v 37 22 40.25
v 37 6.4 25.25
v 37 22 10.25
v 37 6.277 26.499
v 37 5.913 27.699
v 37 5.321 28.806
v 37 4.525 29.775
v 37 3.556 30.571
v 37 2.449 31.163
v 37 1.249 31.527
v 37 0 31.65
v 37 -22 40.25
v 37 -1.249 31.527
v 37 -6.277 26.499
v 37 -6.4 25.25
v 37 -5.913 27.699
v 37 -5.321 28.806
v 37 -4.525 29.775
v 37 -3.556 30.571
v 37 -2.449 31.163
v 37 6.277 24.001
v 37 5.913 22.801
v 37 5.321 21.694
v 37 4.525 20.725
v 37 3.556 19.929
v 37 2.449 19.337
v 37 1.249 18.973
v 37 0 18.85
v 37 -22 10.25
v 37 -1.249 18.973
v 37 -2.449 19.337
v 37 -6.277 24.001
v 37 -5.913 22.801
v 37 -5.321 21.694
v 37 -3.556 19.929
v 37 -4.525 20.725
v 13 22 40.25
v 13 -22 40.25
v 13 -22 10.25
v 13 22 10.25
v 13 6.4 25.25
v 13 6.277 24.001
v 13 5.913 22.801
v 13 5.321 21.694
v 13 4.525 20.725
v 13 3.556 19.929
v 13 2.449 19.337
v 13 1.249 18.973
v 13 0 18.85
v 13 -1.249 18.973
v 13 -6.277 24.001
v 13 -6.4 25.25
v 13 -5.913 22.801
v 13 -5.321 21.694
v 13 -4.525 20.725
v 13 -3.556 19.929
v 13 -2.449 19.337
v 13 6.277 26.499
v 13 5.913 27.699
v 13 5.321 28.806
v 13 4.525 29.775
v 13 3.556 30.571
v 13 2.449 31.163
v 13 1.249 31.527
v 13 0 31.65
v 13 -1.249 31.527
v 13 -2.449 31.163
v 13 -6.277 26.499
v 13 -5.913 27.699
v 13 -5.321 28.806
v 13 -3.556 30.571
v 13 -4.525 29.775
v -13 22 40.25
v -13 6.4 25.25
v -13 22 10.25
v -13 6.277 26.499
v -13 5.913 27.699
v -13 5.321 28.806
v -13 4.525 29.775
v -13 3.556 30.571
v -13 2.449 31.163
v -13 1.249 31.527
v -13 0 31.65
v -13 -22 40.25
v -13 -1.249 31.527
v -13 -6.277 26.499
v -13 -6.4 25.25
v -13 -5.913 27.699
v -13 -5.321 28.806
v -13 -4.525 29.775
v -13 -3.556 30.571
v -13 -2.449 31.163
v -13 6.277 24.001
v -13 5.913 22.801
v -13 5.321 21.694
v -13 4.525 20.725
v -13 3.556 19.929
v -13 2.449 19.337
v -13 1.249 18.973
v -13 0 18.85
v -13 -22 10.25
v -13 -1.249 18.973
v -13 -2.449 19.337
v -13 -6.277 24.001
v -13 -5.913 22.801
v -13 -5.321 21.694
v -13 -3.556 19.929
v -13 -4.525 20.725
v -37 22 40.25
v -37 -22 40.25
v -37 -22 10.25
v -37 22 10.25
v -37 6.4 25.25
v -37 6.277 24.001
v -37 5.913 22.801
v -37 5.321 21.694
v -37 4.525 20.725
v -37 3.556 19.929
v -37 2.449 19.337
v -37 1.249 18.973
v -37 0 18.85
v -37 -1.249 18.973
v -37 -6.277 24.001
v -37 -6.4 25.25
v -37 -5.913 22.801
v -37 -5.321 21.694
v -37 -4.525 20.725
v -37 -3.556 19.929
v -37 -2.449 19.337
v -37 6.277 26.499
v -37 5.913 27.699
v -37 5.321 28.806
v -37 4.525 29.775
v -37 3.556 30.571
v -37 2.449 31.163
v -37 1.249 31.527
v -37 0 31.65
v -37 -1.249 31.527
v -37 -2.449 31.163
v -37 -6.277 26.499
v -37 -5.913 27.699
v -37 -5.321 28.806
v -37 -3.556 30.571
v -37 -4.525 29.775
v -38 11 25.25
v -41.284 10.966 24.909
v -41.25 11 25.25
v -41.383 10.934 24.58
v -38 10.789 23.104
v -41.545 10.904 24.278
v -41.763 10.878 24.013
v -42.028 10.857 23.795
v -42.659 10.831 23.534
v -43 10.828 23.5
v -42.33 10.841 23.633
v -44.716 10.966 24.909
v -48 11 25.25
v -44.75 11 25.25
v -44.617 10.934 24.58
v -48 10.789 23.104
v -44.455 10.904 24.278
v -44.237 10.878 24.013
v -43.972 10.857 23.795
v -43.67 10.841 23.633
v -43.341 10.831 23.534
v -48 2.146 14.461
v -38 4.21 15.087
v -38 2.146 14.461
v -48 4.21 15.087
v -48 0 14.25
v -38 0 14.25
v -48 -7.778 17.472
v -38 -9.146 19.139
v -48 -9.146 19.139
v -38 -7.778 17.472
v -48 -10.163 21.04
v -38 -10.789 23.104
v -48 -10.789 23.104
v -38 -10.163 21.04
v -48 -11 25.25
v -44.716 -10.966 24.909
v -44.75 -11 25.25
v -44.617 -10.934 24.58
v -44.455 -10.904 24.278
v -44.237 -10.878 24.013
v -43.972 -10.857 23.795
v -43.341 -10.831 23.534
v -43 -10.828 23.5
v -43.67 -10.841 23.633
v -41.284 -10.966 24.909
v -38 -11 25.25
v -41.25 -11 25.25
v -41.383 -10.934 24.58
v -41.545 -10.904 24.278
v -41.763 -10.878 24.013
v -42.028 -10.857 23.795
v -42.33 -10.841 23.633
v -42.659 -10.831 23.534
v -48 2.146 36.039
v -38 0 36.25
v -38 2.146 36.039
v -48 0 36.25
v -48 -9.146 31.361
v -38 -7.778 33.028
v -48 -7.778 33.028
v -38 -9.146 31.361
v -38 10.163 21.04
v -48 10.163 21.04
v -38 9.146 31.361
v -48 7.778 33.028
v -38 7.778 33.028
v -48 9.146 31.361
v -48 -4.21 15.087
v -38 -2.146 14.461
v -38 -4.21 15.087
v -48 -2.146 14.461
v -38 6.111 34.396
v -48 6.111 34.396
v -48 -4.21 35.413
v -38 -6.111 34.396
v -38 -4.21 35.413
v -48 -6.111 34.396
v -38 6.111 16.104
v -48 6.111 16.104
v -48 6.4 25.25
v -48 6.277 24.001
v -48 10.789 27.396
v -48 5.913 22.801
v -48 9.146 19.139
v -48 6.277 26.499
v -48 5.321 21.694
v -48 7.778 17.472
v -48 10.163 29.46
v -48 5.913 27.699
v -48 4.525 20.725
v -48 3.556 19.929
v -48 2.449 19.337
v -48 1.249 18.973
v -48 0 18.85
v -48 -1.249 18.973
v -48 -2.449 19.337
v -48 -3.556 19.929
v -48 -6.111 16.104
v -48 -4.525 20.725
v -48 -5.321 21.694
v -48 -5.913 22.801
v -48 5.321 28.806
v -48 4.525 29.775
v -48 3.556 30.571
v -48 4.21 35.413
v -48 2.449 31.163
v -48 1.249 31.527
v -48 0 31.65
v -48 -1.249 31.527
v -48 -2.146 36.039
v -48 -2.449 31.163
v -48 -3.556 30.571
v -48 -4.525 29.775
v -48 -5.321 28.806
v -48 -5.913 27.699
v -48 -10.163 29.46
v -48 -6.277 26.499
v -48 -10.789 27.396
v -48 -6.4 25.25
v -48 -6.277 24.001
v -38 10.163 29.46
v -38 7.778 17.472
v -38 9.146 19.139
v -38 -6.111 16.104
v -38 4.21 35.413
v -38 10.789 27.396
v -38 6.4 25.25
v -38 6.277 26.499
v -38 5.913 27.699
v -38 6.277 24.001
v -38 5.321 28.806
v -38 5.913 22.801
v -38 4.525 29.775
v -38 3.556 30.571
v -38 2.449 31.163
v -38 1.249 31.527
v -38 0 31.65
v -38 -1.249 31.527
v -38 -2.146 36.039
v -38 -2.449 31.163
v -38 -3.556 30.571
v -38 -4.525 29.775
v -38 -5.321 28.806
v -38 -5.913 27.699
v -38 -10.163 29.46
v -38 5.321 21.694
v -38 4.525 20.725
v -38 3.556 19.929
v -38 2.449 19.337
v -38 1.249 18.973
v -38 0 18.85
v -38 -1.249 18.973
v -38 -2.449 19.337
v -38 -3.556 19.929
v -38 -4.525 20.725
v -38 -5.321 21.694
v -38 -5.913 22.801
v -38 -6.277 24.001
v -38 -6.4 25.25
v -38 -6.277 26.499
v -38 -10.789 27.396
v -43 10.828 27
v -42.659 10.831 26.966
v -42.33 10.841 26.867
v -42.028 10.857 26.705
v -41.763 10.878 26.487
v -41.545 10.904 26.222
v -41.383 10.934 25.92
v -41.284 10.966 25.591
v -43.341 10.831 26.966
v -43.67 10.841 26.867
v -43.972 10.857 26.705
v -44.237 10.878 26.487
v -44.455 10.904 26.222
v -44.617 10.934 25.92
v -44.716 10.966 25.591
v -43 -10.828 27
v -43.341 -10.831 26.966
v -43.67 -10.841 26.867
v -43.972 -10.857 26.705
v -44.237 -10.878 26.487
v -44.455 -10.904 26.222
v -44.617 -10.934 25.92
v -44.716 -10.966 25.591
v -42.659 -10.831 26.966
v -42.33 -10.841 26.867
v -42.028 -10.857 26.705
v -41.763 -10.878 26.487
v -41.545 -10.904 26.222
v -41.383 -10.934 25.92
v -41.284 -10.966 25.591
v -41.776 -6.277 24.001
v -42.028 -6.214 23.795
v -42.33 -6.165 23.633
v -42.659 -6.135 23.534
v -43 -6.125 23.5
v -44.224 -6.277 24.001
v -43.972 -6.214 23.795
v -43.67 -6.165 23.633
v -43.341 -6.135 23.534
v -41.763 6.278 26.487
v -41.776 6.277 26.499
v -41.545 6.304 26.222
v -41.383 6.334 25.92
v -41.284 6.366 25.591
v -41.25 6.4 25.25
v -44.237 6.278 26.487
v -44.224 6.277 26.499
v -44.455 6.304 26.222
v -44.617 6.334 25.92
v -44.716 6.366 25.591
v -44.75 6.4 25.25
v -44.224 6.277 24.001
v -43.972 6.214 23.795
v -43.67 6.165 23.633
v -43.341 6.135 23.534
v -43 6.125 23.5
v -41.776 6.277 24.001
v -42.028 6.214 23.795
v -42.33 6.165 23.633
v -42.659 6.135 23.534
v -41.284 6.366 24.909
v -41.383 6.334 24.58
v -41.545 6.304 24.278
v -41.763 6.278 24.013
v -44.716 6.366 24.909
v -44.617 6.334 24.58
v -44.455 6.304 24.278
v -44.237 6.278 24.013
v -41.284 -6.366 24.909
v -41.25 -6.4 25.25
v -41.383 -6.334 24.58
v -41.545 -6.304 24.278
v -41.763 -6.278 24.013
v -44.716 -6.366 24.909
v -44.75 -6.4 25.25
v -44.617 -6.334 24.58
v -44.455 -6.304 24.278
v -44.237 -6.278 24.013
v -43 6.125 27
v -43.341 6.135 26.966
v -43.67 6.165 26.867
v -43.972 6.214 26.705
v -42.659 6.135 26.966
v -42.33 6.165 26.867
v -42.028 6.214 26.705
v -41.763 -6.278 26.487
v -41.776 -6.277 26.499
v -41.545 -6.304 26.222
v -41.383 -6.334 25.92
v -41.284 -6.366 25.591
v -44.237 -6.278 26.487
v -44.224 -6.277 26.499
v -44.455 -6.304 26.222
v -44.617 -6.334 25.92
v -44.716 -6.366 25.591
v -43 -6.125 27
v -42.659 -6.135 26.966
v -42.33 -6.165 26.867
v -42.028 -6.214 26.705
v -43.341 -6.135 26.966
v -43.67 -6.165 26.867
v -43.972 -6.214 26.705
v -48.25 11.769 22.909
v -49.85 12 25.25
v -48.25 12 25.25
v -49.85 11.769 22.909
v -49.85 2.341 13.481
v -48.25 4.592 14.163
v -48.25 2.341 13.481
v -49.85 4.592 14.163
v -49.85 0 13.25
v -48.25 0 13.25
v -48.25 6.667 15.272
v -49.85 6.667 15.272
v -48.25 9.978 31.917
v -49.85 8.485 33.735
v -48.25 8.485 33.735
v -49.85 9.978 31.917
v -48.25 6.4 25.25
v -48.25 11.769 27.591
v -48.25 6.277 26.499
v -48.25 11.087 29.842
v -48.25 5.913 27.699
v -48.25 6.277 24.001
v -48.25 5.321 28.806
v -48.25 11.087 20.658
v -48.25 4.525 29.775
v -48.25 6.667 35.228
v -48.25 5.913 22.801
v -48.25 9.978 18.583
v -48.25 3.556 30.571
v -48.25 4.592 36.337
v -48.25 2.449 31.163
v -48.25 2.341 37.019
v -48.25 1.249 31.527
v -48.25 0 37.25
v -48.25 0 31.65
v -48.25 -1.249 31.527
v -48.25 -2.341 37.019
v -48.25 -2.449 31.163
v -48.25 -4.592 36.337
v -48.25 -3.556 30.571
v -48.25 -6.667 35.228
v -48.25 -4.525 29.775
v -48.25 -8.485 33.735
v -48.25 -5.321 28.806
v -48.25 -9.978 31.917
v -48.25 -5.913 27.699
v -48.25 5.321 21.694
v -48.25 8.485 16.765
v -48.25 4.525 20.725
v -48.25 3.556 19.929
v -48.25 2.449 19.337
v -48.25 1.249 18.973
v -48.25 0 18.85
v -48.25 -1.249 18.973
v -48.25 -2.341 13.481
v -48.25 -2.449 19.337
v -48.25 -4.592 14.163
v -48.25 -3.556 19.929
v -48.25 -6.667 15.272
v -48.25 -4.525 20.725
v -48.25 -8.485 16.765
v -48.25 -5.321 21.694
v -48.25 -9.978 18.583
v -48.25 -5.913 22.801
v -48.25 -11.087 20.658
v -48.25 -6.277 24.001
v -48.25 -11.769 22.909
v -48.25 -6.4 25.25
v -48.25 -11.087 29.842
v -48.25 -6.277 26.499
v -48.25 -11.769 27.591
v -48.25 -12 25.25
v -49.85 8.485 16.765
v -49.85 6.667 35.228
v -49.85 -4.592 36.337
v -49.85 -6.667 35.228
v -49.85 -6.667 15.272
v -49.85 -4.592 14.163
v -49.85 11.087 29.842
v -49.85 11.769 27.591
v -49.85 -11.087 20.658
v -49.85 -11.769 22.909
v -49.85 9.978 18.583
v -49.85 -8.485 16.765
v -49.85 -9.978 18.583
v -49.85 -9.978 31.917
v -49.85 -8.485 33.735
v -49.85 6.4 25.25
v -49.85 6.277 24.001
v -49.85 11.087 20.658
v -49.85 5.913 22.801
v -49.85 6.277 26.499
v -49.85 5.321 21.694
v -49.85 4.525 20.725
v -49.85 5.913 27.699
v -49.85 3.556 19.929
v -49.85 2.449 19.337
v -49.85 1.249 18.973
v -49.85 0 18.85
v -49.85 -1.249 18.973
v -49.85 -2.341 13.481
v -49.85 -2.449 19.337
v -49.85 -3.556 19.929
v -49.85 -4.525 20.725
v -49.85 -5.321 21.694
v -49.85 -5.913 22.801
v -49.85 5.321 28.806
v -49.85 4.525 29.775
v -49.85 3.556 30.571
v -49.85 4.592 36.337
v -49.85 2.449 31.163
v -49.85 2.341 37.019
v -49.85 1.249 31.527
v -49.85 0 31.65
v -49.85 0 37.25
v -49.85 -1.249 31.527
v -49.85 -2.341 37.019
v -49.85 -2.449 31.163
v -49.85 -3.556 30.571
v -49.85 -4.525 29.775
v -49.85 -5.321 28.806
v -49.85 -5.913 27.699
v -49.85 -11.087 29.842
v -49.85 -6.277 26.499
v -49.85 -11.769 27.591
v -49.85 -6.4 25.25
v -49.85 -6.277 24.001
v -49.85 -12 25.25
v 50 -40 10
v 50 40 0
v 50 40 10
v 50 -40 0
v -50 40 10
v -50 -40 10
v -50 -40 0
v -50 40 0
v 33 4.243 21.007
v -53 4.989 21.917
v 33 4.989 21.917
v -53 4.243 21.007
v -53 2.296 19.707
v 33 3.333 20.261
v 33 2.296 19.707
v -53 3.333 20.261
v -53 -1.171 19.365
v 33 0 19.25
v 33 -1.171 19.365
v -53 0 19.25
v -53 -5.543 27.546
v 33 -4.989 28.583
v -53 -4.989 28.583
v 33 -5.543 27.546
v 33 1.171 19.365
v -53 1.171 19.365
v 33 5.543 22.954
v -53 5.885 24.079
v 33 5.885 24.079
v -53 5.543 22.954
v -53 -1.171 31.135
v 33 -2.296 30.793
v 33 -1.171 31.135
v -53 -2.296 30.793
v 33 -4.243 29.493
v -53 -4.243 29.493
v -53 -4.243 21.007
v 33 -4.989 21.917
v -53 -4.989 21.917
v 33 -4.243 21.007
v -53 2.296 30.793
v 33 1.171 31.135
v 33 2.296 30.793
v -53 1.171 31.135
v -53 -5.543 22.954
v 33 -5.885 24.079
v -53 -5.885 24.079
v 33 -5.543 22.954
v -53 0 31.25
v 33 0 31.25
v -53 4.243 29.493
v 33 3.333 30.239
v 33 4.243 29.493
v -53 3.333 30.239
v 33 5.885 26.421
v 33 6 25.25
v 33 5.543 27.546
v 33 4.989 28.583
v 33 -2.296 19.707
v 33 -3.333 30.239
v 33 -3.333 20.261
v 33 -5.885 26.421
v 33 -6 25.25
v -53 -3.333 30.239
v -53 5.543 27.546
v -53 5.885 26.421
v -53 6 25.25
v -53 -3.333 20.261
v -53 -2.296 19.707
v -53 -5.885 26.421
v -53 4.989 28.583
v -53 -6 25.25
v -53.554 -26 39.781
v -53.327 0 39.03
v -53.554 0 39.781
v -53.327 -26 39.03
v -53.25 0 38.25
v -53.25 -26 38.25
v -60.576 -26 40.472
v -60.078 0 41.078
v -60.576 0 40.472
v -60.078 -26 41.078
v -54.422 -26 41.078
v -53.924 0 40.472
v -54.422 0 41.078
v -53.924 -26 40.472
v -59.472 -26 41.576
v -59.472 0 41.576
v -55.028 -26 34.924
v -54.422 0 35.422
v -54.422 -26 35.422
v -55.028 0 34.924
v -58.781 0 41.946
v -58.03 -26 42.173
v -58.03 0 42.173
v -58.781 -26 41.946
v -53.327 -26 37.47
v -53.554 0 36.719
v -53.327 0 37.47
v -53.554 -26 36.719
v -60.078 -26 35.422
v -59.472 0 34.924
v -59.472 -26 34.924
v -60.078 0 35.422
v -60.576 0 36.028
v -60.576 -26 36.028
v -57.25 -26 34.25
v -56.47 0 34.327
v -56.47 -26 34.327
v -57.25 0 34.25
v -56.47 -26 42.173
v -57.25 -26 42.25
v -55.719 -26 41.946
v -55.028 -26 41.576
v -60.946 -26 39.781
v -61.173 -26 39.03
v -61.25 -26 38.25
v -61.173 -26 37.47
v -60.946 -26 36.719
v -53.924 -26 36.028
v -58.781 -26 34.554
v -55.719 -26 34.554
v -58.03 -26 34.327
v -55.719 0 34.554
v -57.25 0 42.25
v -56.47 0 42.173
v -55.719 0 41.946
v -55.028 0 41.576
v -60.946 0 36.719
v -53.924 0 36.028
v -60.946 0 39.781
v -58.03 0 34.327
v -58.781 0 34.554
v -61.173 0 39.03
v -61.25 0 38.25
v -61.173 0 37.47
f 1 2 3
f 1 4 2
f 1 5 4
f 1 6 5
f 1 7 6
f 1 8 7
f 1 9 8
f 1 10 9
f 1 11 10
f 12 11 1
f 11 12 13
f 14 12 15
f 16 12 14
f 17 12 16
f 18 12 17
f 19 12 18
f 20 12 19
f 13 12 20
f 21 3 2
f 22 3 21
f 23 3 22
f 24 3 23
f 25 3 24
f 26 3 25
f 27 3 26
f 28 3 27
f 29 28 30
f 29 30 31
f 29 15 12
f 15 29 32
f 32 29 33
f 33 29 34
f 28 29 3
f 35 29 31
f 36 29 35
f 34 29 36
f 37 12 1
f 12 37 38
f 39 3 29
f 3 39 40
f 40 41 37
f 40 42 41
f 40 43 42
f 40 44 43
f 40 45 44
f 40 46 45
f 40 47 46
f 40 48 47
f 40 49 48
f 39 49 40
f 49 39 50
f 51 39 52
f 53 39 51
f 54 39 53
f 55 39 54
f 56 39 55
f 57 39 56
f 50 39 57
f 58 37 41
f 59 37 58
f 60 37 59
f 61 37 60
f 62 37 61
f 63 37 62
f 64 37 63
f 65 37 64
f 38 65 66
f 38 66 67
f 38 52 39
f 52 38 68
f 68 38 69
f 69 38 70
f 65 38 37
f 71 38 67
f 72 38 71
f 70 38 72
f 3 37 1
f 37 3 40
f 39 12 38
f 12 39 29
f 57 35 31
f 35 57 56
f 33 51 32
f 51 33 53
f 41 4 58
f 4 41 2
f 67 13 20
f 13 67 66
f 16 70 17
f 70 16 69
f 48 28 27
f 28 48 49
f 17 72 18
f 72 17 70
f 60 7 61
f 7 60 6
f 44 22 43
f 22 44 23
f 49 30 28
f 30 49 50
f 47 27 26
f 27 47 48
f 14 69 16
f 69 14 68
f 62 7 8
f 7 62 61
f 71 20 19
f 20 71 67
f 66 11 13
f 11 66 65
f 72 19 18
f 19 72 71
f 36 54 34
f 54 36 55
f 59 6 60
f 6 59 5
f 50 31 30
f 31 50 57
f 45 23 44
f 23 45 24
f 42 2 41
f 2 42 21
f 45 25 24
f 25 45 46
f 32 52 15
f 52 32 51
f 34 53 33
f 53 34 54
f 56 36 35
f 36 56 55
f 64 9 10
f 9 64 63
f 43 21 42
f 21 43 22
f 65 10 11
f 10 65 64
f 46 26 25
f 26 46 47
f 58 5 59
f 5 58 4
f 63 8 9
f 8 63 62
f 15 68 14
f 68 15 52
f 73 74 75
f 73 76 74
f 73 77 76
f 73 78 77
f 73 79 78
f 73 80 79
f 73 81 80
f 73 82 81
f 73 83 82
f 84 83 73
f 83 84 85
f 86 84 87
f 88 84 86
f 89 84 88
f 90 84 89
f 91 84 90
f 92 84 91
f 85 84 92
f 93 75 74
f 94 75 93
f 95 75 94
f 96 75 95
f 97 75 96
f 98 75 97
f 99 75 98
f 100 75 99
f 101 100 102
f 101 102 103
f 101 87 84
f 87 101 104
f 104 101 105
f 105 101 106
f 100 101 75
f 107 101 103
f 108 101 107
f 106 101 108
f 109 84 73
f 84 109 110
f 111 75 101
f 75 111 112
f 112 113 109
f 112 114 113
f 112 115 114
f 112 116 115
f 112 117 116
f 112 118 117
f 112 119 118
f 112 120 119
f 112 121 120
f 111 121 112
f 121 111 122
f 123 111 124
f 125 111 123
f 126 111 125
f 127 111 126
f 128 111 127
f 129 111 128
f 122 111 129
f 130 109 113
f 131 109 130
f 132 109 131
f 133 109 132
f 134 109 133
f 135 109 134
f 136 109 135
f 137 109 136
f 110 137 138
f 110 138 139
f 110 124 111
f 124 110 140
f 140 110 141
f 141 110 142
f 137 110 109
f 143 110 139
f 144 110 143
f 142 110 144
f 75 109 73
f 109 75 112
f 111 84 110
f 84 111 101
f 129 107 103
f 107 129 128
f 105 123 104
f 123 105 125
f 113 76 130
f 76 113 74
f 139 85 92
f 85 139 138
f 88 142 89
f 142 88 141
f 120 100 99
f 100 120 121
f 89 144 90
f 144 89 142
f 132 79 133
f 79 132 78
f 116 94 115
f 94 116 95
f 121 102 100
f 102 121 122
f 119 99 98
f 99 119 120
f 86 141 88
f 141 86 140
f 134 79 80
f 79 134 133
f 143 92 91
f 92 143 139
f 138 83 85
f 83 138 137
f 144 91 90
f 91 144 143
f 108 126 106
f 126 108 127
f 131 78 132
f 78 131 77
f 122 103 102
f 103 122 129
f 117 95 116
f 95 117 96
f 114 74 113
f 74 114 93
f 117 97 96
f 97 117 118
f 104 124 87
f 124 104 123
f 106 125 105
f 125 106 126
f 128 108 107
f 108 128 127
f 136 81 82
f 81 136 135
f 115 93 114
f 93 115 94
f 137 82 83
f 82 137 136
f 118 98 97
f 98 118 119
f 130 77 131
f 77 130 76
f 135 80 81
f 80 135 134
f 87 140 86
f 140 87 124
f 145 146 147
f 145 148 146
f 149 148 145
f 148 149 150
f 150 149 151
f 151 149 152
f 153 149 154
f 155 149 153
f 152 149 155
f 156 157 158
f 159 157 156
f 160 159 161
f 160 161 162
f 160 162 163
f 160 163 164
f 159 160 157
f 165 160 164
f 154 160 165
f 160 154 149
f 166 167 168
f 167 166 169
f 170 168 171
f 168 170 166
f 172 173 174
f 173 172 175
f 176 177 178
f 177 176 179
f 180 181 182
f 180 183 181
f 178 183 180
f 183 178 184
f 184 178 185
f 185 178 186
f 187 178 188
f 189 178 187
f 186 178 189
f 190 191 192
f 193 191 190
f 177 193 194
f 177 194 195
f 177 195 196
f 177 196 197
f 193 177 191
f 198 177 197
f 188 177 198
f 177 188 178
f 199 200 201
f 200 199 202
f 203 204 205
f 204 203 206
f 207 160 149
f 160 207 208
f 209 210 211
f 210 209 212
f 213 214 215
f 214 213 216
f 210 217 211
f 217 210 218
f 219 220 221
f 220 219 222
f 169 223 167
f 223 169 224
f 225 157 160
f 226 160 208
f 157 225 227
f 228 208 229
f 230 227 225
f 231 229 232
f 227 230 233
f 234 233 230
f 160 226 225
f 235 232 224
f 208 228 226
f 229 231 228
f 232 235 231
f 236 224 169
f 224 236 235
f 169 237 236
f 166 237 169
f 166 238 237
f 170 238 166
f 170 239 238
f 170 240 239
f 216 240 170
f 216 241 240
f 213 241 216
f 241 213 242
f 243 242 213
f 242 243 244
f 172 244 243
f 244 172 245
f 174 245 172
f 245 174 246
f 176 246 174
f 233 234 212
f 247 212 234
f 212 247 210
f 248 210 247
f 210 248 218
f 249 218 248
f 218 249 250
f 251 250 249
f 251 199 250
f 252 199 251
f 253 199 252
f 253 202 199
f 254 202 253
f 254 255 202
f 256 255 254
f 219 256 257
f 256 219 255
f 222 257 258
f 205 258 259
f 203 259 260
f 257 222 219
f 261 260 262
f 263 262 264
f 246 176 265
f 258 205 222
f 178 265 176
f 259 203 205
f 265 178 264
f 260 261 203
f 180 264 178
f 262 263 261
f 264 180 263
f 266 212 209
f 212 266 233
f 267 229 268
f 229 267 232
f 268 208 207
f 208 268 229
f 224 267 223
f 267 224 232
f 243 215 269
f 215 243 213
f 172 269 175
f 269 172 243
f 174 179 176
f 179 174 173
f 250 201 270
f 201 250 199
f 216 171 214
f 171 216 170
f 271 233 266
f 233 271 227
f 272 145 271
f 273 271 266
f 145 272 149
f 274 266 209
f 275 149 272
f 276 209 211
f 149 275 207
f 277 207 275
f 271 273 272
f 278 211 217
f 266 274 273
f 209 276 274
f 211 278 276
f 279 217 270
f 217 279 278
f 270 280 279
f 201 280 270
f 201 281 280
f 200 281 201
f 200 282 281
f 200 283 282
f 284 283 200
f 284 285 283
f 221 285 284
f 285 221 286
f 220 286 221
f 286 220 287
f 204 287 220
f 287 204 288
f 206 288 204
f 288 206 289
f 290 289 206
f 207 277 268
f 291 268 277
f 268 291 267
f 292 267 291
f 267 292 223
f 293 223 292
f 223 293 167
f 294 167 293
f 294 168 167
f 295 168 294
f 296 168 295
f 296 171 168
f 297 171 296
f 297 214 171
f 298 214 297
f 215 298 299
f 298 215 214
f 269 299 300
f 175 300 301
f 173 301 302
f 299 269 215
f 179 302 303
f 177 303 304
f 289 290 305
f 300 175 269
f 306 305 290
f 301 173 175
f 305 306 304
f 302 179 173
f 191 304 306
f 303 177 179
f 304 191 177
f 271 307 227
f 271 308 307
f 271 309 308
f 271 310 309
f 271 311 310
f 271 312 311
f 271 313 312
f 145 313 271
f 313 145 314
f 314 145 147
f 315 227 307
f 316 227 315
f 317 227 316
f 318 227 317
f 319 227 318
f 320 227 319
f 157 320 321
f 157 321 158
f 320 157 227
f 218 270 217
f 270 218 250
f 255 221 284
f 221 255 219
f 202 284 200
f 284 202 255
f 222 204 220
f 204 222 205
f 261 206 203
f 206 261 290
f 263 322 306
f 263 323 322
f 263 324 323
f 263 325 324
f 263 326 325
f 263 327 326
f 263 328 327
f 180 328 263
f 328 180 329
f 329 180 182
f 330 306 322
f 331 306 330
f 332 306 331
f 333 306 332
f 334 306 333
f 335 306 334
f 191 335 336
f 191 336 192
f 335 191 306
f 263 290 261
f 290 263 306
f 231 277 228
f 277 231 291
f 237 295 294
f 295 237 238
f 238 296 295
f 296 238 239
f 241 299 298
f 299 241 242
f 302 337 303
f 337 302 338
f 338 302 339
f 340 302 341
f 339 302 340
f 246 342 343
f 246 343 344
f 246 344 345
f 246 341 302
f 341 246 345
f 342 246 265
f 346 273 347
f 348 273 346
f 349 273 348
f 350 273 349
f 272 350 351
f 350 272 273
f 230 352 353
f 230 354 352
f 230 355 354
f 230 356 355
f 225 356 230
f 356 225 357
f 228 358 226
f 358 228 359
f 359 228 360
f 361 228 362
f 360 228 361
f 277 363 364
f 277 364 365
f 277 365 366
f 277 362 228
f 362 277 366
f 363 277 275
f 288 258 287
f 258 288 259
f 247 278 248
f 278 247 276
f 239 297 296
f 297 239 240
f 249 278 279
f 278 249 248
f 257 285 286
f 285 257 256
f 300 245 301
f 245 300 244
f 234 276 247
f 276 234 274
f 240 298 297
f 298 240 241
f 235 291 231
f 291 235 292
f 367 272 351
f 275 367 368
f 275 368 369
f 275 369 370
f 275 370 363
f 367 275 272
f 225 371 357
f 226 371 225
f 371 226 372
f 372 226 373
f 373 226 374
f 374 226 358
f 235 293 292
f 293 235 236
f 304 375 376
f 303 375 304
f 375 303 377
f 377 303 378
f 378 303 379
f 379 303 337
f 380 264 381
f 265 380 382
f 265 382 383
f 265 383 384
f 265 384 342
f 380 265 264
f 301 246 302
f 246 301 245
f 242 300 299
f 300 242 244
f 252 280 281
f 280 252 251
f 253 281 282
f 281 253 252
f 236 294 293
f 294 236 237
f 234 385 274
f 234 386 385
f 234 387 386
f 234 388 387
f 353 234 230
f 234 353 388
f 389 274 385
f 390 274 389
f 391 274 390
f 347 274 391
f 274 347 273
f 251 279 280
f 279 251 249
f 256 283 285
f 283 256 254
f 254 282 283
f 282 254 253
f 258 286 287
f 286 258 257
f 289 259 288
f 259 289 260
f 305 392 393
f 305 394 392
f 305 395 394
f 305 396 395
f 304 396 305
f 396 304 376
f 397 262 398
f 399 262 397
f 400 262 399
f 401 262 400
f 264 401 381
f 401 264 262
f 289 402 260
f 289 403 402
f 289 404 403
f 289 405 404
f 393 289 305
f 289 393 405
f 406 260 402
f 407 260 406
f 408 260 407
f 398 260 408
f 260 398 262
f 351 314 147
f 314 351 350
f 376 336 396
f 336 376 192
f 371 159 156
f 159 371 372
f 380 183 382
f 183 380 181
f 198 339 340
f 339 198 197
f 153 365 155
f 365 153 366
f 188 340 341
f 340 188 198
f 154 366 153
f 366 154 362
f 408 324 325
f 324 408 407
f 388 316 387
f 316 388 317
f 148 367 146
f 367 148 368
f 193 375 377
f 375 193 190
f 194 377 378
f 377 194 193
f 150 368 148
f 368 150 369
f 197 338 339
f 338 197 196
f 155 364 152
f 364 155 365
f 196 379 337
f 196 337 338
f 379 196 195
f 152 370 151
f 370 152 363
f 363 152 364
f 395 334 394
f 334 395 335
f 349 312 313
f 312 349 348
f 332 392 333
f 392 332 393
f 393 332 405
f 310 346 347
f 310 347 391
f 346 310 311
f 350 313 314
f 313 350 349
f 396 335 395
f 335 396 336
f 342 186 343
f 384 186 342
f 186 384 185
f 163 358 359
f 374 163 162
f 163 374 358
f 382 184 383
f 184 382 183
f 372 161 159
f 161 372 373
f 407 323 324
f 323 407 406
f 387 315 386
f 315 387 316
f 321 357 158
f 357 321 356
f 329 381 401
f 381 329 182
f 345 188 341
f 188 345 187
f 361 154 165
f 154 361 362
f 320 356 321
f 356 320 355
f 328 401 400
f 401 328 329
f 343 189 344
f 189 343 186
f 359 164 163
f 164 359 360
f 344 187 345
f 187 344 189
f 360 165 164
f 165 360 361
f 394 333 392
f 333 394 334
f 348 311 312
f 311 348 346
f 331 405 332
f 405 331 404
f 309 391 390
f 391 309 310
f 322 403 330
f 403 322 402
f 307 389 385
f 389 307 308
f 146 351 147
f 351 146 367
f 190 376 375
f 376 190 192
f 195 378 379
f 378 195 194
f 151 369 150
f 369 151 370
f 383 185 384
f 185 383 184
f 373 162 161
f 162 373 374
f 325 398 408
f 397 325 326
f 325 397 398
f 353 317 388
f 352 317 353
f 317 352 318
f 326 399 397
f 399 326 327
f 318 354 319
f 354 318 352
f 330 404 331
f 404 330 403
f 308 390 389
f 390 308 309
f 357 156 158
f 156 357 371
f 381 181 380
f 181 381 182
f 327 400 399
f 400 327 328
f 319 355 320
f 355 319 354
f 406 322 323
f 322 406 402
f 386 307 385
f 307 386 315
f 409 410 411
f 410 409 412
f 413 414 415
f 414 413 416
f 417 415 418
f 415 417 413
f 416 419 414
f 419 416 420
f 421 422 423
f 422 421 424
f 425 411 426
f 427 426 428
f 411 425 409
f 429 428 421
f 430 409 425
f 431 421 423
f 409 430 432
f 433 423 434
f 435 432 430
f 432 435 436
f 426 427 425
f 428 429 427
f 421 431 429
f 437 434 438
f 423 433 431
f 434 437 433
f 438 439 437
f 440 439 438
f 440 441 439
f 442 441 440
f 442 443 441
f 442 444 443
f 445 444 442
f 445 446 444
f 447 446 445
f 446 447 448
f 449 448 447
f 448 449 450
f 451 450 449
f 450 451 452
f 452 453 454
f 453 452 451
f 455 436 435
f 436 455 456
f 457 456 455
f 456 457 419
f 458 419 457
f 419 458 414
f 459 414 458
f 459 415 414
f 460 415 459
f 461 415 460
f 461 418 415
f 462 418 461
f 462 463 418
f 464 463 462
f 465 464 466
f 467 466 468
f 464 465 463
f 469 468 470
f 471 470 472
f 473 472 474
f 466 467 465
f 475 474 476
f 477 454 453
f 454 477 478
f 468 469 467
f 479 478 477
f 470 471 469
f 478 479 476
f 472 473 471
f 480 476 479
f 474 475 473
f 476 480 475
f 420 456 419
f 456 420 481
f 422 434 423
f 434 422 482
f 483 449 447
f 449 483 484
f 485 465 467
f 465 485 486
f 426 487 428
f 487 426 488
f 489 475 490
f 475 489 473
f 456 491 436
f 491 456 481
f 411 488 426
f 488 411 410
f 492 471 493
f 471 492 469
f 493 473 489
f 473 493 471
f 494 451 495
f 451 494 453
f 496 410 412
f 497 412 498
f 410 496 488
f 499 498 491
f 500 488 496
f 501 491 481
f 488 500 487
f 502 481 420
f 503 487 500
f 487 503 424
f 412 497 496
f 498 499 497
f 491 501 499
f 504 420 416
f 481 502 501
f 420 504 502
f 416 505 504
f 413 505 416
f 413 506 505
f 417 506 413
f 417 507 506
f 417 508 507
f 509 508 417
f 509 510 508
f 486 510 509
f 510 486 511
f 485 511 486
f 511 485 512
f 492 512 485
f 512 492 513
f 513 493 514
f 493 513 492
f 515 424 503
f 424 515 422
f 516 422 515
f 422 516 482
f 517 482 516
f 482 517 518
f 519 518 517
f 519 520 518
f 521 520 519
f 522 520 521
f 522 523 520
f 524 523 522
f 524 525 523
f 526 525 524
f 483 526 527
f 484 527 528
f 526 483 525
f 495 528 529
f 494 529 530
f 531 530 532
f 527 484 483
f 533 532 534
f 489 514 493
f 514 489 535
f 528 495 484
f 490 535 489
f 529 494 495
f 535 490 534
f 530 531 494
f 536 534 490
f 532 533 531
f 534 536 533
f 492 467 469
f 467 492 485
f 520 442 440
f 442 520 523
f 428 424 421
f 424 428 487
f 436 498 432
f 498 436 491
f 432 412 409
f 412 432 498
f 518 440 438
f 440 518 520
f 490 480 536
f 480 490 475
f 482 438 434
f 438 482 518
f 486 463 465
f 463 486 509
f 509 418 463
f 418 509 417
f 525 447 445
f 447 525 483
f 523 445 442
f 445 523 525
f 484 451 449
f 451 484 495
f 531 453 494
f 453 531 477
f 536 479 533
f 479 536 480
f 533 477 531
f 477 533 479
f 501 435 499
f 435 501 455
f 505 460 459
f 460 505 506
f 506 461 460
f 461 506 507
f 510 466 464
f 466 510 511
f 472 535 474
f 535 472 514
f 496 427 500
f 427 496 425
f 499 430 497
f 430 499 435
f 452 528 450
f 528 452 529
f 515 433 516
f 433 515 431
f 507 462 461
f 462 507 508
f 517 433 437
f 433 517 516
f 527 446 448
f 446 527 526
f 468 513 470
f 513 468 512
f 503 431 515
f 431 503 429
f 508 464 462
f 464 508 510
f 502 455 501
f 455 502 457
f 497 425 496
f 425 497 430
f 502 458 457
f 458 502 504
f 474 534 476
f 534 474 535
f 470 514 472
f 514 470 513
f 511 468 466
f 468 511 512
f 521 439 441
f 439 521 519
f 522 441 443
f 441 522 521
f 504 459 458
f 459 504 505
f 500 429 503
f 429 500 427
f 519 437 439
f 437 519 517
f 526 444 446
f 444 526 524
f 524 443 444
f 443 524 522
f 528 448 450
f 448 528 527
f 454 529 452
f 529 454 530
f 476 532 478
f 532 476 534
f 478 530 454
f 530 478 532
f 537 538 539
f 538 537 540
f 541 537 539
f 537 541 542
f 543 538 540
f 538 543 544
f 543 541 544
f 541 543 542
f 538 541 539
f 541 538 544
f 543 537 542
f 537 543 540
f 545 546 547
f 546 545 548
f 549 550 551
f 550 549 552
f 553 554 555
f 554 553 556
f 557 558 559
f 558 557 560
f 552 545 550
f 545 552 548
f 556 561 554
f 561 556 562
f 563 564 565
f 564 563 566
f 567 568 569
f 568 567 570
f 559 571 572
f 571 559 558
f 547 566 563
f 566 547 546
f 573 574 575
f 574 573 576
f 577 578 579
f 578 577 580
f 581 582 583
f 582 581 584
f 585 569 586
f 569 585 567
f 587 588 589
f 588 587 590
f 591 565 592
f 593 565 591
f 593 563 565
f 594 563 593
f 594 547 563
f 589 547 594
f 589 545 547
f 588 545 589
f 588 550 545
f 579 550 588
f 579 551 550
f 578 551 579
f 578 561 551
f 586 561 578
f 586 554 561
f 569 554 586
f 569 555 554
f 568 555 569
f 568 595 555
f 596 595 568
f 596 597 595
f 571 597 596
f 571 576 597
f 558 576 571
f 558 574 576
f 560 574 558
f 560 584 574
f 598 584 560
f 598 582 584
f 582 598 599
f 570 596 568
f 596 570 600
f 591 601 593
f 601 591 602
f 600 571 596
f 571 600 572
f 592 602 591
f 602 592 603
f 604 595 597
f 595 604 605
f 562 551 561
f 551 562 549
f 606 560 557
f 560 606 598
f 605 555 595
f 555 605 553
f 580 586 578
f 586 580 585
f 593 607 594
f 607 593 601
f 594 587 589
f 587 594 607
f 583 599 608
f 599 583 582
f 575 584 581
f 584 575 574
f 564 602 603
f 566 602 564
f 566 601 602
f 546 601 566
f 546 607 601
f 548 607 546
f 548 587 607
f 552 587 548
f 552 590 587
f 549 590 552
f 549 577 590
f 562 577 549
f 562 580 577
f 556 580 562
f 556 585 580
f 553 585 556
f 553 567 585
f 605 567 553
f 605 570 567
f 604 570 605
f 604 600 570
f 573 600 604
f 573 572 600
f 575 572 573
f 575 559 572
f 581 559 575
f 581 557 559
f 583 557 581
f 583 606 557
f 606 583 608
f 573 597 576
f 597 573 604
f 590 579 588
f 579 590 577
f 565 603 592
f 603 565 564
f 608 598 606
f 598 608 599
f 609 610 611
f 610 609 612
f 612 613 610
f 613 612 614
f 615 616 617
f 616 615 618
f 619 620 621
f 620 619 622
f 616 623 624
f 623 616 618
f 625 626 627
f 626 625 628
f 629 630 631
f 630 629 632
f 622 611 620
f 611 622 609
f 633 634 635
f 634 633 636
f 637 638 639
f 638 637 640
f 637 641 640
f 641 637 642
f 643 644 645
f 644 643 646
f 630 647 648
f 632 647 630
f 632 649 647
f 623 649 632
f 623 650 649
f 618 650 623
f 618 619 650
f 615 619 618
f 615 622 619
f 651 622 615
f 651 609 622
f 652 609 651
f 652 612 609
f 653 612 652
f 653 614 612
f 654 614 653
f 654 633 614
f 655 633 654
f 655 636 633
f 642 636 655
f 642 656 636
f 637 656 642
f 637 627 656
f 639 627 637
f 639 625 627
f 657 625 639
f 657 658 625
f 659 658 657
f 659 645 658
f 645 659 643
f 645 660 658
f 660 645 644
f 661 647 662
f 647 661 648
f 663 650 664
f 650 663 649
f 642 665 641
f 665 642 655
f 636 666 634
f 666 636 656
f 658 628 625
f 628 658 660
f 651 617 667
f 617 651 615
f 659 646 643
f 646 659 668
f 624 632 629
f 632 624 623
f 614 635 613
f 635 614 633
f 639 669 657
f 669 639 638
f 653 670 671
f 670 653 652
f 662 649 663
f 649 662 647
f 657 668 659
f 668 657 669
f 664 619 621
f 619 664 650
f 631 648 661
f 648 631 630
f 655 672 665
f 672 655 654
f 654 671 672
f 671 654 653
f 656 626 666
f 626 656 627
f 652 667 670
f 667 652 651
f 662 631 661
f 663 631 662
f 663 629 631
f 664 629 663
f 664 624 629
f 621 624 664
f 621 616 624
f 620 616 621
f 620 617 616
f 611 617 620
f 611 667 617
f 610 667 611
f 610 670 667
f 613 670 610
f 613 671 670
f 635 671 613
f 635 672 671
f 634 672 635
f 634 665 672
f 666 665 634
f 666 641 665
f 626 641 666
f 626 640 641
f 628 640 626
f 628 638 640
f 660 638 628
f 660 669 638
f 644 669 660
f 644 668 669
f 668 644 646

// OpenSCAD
$fn = 32;

// ------------------------------------------------------------------------
// Machine vise: screw d12, jaws 24 x 30 mm
// Every part is its own module, assembly() places every instance.
// ------------------------------------------------------------------------

// --- part 1 ---
module vise_bed() {
  difference() {
    translate([-50, -40, 0]) cube([100, 80, 10]);
  }
}

// --- part 2 ---
module vise_jaw() {
  difference() {
    translate([-12, -22, 0]) cube([24, 44, 30]);
    translate([0, 0, 15]) rotate([0, 90, 0]) cylinder(h = 26, d = 12.8, center = true);
  }
}

// --- part 3 ---
module vise_screw() {
  translate([0, 0, -43]) cylinder(h = 86, d = 12);
}

// --- part 4 ---
module screw_collar() {
  difference() {
    cylinder(h = 10, d = 22);
    translate([0, 0, -1]) cylinder(h = 12, d = 12.8);
    translate([0, 0, 5]) rotate([90, 0, 0]) cylinder(h = 24, d = 3.5, center = true);
  }
}

// --- part 5 ---
module screw_washer() {
  difference() {
      translate([0, 0, 0]) cylinder(h = 1.6, d = 24);
      translate([0, 0, -1]) cylinder(h = 3.6, d = 12.8);
    }
}

// --- part 6 ---
module vise_handle() {
  cylinder(h = 26, d = 8);
}

// --- assembly ---
module assembly() {
  color([0.80, 0.24, 0.20]) translate([0, 0, 0]) rotate([0, 0, 0]) vise_bed();
  color([0.20, 0.45, 0.75]) translate([25, 0, 10.25]) rotate([0, 0, 0]) vise_jaw();
  color([0.25, 0.62, 0.32]) translate([-25, 0, 10.25]) rotate([0, 0, 0]) vise_jaw();
  color([0.92, 0.70, 0.18]) translate([-10, 0, 25.25]) rotate([0, 90, 0]) vise_screw();
  color([0.58, 0.35, 0.70]) translate([-48, 0, 25.25]) rotate([0, 90, 0]) screw_collar();
  color([0.16, 0.66, 0.66]) translate([-49.85, 0, 25.25]) rotate([0, 90, 0]) screw_washer();
  color([0.85, 0.48, 0.18]) translate([-57.25, 0, 38.25]) rotate([90, 0, 0]) vise_handle();
}

assembly();
